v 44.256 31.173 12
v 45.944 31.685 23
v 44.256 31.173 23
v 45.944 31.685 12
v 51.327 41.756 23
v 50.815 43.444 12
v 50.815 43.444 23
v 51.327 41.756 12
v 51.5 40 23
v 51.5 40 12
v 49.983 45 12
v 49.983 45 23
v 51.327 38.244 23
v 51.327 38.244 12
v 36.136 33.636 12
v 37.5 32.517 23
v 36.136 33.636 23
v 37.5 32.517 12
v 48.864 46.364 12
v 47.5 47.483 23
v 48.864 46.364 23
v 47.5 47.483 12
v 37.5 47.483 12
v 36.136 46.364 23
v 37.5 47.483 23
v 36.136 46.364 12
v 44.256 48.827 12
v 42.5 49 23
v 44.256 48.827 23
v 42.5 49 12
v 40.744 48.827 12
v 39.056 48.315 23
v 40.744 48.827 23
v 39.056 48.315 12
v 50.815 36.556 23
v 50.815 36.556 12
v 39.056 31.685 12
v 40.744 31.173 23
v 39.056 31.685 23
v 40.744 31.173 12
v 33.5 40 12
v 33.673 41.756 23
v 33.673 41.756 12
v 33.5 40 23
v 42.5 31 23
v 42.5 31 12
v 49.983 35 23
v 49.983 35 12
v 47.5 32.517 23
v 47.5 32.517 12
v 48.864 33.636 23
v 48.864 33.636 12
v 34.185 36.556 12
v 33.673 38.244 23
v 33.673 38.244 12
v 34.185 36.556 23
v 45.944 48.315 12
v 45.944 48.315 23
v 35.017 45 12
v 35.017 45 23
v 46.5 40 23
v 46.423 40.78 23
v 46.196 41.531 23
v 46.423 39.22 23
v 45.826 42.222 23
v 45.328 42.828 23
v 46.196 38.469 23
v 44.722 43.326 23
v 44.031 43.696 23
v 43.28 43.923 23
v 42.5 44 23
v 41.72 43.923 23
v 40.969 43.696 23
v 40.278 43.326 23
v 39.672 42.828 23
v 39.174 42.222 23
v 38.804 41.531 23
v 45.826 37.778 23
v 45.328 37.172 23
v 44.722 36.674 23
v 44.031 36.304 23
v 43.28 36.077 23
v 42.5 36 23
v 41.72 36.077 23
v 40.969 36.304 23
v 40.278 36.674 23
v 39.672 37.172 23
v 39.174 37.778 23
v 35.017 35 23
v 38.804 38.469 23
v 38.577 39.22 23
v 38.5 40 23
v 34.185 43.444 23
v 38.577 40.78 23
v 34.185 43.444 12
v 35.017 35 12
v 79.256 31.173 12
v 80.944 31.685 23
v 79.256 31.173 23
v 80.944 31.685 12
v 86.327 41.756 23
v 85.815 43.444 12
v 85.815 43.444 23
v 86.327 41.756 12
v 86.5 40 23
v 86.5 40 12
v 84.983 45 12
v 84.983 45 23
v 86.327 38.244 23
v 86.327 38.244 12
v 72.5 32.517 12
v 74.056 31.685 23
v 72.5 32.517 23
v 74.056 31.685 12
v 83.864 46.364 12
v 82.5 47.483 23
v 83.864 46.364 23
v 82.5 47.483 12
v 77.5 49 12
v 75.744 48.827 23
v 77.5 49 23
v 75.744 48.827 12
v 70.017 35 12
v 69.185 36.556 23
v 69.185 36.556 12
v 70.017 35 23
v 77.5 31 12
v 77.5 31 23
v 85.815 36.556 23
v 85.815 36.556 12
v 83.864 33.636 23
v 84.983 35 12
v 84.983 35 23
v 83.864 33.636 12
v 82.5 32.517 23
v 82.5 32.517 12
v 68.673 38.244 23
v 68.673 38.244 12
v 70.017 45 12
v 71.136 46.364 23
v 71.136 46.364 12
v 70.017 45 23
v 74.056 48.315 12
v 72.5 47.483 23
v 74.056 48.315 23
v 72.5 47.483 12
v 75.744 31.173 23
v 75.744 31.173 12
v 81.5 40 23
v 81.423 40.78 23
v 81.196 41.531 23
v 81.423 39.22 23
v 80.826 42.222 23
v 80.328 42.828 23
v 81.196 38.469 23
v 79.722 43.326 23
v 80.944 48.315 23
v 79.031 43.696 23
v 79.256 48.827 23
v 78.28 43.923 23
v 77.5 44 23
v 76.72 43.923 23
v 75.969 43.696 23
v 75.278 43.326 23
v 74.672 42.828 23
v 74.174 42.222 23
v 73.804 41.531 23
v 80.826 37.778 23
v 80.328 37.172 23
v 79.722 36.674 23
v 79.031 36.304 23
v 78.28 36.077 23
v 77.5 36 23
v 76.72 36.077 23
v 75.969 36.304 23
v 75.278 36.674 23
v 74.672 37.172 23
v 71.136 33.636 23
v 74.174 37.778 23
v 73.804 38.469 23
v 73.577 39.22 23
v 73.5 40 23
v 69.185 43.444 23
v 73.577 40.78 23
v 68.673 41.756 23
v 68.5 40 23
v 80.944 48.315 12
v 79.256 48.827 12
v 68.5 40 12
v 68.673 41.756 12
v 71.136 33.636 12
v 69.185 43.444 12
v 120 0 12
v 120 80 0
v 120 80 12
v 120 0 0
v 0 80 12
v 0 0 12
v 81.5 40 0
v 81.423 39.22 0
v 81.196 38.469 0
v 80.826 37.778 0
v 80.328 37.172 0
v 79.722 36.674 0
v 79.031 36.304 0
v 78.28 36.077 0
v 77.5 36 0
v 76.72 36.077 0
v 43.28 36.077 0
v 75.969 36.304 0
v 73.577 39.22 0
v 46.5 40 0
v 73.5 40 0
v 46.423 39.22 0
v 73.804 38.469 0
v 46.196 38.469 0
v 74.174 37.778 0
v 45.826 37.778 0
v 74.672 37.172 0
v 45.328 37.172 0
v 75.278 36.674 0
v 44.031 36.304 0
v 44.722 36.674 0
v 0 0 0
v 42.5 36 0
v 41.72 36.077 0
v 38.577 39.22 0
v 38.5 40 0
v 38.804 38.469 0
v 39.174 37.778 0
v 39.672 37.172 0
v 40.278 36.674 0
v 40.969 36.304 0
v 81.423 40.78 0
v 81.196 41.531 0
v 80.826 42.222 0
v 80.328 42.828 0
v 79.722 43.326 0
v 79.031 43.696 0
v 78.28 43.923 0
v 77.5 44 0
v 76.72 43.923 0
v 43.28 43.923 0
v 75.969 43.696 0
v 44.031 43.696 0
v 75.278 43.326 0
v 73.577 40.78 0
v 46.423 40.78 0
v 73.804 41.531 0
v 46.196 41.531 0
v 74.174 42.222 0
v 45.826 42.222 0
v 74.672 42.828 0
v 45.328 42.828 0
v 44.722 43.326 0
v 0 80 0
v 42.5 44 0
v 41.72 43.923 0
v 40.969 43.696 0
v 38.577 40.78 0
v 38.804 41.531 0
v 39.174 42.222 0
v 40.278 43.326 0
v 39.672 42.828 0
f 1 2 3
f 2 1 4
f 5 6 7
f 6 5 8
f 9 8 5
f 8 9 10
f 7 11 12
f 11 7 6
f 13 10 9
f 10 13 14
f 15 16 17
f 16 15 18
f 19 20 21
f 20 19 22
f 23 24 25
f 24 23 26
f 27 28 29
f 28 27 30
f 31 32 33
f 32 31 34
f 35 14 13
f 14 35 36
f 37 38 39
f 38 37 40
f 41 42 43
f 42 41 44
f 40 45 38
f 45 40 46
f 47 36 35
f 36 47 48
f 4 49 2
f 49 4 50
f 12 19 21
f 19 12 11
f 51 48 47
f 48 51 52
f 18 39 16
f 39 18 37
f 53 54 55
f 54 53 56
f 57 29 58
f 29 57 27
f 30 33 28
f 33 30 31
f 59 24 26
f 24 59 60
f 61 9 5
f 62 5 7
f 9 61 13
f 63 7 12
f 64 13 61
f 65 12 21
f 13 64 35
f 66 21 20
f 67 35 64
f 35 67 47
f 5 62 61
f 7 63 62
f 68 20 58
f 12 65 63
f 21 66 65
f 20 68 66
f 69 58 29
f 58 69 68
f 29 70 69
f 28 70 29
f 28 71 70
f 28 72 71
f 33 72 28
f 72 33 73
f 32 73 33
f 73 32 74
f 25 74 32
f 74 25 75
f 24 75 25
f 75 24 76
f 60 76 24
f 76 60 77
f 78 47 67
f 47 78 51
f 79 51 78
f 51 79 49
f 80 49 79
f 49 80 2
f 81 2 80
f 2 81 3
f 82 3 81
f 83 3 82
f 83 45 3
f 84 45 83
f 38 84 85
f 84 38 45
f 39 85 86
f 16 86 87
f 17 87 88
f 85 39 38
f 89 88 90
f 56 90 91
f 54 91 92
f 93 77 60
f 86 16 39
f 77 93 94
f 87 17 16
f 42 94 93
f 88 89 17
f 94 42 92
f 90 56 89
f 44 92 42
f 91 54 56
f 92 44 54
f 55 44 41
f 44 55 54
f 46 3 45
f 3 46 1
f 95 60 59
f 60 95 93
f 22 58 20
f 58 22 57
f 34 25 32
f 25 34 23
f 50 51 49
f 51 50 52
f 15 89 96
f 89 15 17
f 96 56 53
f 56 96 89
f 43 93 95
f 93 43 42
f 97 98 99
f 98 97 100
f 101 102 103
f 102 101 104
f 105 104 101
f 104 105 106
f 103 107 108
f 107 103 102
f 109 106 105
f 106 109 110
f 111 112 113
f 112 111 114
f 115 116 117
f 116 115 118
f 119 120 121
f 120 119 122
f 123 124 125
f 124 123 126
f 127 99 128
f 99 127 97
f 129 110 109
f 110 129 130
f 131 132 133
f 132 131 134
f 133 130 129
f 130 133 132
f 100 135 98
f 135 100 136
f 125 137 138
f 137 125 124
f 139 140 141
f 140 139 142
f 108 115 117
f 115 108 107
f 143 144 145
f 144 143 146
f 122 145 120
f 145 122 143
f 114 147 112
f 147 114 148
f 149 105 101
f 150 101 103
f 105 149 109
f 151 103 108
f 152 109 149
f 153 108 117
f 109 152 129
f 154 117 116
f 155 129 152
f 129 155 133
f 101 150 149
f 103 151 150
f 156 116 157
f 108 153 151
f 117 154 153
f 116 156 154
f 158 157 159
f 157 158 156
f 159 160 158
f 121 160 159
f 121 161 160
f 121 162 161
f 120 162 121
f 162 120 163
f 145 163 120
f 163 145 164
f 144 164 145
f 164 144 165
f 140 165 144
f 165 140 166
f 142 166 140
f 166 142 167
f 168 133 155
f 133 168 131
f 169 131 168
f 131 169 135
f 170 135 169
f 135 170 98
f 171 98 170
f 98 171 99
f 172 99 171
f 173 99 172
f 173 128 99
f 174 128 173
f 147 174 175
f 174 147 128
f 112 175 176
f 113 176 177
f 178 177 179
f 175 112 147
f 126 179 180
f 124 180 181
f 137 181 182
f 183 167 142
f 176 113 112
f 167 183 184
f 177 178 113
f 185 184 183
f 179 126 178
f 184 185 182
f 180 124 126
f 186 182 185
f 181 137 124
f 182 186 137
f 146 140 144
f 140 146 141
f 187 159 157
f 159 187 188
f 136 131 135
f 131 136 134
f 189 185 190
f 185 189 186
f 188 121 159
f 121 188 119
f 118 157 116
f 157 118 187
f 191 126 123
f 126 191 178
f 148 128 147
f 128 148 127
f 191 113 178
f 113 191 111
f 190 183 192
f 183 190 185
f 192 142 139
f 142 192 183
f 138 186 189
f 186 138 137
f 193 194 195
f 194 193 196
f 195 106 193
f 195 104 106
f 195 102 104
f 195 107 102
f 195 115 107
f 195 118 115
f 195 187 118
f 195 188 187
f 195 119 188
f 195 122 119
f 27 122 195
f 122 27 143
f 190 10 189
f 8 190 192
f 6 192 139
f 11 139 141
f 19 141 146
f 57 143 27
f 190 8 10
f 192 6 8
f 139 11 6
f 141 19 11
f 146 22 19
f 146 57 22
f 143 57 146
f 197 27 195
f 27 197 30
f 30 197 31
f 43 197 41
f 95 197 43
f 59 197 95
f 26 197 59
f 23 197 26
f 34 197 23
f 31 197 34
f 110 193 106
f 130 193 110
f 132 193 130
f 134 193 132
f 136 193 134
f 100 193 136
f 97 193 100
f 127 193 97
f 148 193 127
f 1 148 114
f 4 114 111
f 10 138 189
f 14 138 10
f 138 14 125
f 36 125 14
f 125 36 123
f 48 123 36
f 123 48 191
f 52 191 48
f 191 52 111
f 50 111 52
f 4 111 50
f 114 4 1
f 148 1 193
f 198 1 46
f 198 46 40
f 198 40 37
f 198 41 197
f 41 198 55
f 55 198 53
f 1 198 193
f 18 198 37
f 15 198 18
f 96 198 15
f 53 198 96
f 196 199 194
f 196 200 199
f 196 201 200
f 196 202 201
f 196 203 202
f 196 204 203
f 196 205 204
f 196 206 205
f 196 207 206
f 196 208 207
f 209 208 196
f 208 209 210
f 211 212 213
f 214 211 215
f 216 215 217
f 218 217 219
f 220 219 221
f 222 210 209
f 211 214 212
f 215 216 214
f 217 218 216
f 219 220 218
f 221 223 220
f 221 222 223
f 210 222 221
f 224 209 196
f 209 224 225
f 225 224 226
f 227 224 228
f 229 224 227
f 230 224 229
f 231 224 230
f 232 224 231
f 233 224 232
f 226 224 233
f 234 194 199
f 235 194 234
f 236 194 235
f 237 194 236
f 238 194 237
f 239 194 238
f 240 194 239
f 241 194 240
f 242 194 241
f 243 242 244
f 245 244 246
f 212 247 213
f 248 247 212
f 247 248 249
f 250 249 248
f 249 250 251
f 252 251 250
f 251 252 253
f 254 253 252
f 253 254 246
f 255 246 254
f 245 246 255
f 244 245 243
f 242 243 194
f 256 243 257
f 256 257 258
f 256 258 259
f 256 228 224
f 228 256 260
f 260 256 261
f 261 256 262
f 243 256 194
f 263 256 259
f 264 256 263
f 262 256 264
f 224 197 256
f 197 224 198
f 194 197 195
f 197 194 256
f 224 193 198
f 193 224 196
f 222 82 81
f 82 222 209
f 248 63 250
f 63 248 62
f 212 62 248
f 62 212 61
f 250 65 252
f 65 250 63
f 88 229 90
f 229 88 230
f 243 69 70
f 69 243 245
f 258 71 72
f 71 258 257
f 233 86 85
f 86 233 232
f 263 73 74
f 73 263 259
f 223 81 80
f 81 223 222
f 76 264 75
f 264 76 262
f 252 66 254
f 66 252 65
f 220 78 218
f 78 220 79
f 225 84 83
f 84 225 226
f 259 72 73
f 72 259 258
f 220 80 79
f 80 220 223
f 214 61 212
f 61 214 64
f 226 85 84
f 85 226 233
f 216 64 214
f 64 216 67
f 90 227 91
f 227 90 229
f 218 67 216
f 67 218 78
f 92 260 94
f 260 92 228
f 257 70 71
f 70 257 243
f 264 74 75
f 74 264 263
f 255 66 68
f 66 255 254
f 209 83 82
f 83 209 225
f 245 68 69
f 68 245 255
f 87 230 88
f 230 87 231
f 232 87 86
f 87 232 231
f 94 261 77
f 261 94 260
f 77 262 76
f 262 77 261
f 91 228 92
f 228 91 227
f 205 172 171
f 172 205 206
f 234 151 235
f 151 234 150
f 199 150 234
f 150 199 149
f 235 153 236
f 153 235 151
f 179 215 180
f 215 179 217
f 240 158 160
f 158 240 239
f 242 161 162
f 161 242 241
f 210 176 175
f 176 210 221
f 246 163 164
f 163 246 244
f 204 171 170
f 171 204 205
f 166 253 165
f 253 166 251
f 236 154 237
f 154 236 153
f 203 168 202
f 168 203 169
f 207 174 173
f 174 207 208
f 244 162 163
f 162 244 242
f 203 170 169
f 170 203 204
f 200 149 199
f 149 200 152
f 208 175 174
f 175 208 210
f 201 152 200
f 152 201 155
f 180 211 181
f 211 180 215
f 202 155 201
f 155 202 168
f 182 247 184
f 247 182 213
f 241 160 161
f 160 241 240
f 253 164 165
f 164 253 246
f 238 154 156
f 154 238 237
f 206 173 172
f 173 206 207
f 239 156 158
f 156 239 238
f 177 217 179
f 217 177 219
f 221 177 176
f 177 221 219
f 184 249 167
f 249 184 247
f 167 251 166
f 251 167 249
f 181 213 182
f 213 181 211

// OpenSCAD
$fn = 32;

// ----------------------------------------------------------------------
// Drill jig: two_boss jig
// ----------------------------------------------------------------------

// --- parameters (mm) ---
plate_l = 120;            // plate length, X
plate_w = 80;             // plate width, Y
plate_t = 12;             // plate thickness
boss_d = 18;              // guide boss diameter
boss_h = 12;              // boss height above the plate
guide_d = 8;              // guide hole diameter
boss_pitch = 35;          // boss pitch

n_boss = 2;  // guide bosses
boss_x0 = (plate_l - (n_boss - 1) * boss_pitch) / 2;  // first boss X
boss_top = plate_t - 1 + boss_h;  // boss crown height
total_h = boss_top;  // overall height

difference() {
  union() {
  cube([plate_l, plate_w, plate_t]);
  for (i = [0 : n_boss - 1])
    translate([boss_x0 + i * boss_pitch, plate_w / 2, plate_t - 1])
      cylinder(h = boss_h, d = boss_d);
  }
  for (i = [0 : n_boss - 1])
    translate([boss_x0 + i * boss_pitch, plate_w / 2, -1])
      cylinder(h = plate_t + boss_h, d = guide_d);
}
